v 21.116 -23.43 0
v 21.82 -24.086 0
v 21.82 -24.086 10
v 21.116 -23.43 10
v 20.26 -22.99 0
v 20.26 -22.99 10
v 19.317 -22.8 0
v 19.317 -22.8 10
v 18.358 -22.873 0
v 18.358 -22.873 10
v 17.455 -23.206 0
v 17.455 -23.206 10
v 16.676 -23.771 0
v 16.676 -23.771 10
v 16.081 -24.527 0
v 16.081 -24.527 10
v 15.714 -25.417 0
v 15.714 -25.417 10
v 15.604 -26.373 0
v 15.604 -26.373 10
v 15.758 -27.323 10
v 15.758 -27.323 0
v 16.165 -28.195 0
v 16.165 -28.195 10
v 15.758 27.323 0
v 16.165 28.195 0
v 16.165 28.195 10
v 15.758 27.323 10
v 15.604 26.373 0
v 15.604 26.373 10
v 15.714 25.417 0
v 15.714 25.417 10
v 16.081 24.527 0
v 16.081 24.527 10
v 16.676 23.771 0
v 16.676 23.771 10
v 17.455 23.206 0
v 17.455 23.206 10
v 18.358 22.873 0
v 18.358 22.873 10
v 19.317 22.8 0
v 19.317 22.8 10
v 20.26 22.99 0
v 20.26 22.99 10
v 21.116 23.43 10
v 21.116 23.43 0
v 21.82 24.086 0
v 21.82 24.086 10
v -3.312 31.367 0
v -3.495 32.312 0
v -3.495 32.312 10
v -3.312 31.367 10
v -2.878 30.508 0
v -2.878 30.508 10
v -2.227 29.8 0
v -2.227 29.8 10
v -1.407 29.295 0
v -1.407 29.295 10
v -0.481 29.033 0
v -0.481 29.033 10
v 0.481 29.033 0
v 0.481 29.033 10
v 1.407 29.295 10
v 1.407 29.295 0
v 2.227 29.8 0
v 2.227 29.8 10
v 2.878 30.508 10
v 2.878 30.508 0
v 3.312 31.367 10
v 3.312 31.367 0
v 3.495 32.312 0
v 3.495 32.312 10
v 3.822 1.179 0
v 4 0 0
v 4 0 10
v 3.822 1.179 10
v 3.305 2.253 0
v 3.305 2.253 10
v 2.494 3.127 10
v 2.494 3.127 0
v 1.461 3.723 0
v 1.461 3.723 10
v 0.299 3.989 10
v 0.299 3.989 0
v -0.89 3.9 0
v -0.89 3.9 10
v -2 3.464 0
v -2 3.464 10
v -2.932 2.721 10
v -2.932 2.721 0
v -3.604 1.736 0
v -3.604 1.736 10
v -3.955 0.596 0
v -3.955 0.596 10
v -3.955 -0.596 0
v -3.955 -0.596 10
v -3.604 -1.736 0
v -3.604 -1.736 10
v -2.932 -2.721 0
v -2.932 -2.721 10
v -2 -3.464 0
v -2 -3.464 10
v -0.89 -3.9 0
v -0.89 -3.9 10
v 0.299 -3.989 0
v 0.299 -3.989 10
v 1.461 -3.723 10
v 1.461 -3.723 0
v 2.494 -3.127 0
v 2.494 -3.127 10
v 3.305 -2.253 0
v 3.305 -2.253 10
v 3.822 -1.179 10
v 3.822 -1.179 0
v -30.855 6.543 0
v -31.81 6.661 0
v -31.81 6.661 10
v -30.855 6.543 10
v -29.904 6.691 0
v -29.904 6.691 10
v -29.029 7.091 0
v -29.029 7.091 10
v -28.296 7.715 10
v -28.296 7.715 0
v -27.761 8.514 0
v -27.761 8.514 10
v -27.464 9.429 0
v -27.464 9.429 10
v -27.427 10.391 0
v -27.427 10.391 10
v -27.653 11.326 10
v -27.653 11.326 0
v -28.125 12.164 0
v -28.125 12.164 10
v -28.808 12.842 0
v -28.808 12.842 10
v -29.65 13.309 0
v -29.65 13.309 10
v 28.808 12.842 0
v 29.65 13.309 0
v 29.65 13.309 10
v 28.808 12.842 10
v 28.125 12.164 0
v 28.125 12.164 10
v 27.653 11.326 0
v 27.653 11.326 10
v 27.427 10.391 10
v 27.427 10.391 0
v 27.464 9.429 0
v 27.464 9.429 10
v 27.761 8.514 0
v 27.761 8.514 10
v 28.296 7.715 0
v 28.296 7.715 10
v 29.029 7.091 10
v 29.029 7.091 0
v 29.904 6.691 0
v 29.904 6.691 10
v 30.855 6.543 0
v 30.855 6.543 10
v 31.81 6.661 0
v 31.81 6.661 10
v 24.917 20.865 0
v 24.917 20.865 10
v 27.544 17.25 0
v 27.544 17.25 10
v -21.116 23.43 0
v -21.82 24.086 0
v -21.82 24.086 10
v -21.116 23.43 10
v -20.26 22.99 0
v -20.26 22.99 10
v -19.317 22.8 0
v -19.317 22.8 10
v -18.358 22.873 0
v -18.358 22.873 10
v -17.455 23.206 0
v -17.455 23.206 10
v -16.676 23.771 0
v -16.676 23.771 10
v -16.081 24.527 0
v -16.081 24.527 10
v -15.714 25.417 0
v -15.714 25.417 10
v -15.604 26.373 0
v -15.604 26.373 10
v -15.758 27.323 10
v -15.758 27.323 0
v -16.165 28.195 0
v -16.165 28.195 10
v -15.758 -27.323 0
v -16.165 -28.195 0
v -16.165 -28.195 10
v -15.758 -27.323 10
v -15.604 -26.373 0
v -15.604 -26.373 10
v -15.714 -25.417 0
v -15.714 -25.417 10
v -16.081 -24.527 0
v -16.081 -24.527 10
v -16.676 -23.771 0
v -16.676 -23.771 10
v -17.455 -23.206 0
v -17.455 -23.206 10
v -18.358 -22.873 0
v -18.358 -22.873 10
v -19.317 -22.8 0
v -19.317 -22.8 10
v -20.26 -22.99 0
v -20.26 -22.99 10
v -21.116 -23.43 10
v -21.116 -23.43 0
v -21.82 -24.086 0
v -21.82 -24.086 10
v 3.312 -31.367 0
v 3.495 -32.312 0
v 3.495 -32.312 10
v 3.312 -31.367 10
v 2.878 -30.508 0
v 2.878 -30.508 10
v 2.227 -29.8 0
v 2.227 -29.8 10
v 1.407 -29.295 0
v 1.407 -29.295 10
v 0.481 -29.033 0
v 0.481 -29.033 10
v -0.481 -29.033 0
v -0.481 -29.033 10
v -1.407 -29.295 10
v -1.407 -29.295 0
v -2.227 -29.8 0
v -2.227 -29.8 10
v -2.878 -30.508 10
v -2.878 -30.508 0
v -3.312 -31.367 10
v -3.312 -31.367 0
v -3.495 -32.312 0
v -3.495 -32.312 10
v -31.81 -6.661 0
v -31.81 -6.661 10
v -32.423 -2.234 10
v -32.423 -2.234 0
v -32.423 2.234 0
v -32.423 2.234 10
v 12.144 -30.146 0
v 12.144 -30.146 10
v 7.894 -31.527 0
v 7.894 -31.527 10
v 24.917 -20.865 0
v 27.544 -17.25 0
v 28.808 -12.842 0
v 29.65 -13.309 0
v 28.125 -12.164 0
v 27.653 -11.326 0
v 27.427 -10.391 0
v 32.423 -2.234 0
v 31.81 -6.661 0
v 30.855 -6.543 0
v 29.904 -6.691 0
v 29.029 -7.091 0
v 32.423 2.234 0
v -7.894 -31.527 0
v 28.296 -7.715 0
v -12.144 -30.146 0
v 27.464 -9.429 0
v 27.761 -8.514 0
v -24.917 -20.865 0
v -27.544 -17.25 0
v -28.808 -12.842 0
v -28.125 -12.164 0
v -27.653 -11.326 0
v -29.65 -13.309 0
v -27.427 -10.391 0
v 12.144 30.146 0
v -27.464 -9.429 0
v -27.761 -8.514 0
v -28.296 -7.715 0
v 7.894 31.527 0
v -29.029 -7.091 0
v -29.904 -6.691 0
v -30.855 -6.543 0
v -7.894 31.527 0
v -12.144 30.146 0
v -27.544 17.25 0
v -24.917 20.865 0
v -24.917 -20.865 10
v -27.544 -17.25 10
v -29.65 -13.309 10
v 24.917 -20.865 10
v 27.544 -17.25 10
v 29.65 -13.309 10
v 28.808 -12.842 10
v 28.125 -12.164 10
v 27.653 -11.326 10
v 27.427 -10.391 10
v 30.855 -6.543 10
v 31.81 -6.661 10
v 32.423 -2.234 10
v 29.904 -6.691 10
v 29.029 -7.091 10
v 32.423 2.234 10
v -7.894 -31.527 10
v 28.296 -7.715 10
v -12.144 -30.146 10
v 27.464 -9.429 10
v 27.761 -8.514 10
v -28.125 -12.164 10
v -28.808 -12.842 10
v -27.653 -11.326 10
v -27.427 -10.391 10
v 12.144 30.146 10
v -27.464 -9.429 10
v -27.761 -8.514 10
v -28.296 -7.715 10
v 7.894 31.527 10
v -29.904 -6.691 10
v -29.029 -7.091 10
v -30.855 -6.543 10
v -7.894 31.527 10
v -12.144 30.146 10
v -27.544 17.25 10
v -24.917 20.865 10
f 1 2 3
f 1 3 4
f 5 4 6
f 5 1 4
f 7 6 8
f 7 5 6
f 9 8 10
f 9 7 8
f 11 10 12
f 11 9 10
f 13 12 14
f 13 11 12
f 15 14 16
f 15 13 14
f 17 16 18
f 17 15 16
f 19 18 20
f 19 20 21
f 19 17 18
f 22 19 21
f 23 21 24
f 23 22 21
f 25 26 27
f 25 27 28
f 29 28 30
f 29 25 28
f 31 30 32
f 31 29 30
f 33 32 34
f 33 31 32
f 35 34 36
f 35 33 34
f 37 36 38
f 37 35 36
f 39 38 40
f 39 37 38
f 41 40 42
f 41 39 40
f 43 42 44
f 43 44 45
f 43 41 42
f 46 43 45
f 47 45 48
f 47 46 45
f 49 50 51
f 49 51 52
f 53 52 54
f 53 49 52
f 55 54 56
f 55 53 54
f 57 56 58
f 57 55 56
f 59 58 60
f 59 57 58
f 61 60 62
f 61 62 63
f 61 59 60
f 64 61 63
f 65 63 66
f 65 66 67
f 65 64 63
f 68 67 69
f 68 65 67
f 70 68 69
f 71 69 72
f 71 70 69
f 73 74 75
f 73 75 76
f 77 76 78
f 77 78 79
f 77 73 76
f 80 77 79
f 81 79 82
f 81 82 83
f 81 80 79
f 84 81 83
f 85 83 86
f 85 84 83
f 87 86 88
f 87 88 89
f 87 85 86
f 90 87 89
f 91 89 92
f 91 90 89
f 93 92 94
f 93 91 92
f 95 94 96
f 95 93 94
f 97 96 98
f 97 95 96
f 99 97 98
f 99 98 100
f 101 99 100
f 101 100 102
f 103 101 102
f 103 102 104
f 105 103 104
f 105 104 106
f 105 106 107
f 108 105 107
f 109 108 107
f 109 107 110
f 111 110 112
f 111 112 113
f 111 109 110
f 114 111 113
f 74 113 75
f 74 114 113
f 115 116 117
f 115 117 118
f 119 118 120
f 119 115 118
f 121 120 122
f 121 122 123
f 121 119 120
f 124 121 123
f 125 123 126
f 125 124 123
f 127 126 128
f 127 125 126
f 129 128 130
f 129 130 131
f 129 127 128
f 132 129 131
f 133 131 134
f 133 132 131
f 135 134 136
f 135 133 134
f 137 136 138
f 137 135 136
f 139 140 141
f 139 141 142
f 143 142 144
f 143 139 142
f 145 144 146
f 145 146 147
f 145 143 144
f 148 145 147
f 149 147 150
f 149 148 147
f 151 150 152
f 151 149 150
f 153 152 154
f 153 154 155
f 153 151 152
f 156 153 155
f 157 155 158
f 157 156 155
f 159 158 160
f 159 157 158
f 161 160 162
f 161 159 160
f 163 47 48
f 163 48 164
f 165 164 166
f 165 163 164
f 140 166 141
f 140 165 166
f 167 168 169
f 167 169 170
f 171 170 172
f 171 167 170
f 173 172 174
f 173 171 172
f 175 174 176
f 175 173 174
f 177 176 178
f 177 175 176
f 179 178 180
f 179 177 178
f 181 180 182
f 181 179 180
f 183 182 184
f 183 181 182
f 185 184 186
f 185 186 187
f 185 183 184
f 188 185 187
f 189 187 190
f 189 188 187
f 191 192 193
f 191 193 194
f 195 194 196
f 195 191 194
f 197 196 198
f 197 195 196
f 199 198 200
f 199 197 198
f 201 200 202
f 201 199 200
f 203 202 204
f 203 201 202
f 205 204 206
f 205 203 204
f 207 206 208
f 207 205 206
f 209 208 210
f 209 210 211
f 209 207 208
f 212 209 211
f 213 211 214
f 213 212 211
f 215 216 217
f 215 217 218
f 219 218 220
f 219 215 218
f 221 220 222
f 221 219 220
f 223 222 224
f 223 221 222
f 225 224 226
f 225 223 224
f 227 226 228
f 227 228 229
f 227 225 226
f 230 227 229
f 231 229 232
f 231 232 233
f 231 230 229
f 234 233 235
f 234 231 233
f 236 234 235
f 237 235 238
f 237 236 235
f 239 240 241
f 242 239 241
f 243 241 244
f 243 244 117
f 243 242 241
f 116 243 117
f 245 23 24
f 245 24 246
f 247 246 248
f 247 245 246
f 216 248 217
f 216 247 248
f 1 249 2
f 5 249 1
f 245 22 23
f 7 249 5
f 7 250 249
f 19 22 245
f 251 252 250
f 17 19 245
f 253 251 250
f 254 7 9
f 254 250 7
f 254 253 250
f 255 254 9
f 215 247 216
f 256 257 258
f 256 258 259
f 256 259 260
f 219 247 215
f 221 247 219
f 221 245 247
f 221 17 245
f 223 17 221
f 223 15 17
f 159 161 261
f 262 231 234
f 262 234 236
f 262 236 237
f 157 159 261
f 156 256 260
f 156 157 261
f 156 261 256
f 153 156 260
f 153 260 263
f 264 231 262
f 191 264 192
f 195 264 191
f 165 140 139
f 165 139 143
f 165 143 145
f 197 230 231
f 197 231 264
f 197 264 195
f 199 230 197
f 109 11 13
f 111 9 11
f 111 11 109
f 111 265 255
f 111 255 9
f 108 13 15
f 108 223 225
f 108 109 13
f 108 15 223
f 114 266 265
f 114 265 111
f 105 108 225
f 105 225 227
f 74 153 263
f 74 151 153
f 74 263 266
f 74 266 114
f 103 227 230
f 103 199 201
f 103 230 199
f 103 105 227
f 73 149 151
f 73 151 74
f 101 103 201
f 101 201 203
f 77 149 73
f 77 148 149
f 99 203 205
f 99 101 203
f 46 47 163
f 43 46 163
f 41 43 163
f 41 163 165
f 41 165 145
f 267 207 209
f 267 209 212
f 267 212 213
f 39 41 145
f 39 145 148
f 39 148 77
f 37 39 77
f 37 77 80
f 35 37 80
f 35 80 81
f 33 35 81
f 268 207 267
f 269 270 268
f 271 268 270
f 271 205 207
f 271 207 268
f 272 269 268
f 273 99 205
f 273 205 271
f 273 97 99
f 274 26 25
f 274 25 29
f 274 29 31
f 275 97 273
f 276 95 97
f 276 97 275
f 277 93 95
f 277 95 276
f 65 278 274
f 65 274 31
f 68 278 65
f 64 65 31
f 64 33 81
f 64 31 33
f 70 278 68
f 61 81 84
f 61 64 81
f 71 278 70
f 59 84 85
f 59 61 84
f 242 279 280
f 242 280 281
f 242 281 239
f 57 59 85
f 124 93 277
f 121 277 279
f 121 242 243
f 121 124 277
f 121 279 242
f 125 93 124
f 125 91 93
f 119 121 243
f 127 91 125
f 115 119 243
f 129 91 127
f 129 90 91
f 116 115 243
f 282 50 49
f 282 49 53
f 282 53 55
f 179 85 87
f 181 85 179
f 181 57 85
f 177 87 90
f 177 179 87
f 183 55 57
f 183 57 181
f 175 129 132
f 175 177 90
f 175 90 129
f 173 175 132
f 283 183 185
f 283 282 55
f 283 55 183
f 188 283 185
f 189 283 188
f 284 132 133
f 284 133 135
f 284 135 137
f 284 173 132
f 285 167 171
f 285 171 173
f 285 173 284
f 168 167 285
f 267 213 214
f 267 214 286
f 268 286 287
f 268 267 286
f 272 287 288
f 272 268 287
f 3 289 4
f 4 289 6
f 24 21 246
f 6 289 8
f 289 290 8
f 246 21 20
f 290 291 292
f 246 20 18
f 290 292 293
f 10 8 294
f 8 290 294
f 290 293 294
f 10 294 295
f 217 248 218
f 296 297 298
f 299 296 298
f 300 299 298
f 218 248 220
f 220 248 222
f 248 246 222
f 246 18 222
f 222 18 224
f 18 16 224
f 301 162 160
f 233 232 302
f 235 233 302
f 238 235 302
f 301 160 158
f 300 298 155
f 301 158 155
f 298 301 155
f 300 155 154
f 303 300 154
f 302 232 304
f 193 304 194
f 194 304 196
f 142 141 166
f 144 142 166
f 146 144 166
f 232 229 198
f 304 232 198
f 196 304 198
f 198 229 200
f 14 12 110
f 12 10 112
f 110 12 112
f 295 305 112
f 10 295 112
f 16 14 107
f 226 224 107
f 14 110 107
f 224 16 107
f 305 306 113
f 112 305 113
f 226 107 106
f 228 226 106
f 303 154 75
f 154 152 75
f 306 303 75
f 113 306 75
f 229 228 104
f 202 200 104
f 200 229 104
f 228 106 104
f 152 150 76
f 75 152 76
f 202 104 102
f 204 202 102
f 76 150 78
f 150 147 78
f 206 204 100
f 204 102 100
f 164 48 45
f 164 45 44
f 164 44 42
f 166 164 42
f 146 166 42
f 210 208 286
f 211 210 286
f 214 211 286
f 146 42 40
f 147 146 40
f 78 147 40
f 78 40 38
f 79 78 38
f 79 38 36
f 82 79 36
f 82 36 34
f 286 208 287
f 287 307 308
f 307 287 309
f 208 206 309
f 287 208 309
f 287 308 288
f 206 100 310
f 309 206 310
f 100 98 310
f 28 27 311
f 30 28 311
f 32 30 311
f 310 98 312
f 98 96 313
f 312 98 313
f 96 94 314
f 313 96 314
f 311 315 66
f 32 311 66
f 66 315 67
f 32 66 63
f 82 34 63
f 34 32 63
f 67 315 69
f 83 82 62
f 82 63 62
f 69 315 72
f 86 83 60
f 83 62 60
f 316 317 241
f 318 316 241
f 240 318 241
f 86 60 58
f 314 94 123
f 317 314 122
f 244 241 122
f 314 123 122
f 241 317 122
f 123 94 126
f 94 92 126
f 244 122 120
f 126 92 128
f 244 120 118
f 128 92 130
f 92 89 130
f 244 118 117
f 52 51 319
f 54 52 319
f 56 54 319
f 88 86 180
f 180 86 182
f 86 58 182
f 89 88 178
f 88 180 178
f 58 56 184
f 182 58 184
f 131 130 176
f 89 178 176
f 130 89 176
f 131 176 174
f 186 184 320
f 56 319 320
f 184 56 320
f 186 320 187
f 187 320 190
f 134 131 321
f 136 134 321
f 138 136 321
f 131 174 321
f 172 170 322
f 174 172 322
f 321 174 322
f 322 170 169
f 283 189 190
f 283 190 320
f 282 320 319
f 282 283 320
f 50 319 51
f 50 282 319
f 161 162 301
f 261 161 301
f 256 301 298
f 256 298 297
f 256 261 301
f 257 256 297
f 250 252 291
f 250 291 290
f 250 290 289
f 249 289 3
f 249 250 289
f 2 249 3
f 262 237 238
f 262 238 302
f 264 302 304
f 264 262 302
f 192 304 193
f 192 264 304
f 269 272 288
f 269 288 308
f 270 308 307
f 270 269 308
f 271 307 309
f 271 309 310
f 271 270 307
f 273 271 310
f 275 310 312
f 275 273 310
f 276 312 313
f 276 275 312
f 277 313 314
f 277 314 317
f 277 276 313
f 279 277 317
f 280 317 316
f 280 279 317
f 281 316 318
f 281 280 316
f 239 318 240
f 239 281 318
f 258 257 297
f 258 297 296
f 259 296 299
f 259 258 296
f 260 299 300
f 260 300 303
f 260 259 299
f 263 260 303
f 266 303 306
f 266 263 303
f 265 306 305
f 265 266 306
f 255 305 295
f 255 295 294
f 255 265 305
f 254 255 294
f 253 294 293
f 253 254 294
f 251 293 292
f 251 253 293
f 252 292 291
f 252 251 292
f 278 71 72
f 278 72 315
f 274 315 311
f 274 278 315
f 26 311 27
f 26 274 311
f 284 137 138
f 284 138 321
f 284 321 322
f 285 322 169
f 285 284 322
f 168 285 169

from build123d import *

# Parameters (mm, degrees)
CROQUIS1_R              = 4
SALIENTE_EXTRUIR1_DEPTH = 10


with BuildPart() as part:
    # Croquis1 → Saliente-Extruir1 (new body)
    with BuildSketch(Plane.XY):
        with BuildLine():
            ThreePointArc((-29.650108804, -13.308683176), (-27.580638973, -8.961492837), (-31.810089606, -6.660945822))
            ThreePointArc((-31.810089606, -6.660945822), (-32.5, 0), (-31.810089606, 6.660945822))
            ThreePointArc((-31.810089606, 6.660945822), (-27.580638973, 8.961492837), (-29.650108804, 13.308683176))
            ThreePointArc((-29.650108804, 13.308683176), (-26.293052317, 19.1030207), (-21.819697364, 24.086319913))
            ThreePointArc((-21.819697364, 24.086319913), (-17.045772316, 23.461492837), (-16.16479421, 28.194847546))
            ThreePointArc((-16.16479421, 28.194847546), (-10.043052317, 30.90933678), (-3.494922352, 32.311538462))
            ThreePointArc((-3.494922352, 32.311538462), (0, 29), (3.494922352, 32.311538462))
            ThreePointArc((3.494922352, 32.311538462), (10.043052317, 30.90933678), (16.16479421, 28.194847546))
            ThreePointArc((16.16479421, 28.194847546), (17.045772316, 23.461492837), (21.819697364, 24.086319913))
            ThreePointArc((21.819697364, 24.086319913), (26.293052317, 19.1030207), (29.650108804, 13.308683176))
            ThreePointArc((29.650108804, 13.308683176), (27.580638973, 8.961492837), (31.810089606, 6.660945822))
            ThreePointArc((31.810089606, 6.660945822), (32.5, 0), (31.810089606, -6.660945822))
            ThreePointArc((31.810089606, -6.660945822), (27.580638973, -8.961492837), (29.650108804, -13.308683176))
            ThreePointArc((29.650108804, -13.308683176), (26.293052317, -19.1030207), (21.819697364, -24.086319913))
            ThreePointArc((21.819697364, -24.086319913), (17.045772316, -23.461492837), (16.16479421, -28.194847546))
            ThreePointArc((16.16479421, -28.194847546), (10.043052317, -30.90933678), (3.494922352, -32.311538462))
            ThreePointArc((3.494922352, -32.311538462), (0, -29), (-3.494922352, -32.311538462))
            ThreePointArc((-3.494922352, -32.311538462), (-10.043052317, -30.90933678), (-16.16479421, -28.194847546))
            ThreePointArc((-16.16479421, -28.194847546), (-17.045772316, -23.461492837), (-21.819697364, -24.086319913))
            ThreePointArc((-21.819697364, -24.086319913), (-26.293052317, -19.1030207), (-29.650108804, -13.308683176))
        make_face()
        Circle(CROQUIS1_R, mode=Mode.SUBTRACT)
    extrude(amount=SALIENTE_EXTRUIR1_DEPTH)


solid = part.part
